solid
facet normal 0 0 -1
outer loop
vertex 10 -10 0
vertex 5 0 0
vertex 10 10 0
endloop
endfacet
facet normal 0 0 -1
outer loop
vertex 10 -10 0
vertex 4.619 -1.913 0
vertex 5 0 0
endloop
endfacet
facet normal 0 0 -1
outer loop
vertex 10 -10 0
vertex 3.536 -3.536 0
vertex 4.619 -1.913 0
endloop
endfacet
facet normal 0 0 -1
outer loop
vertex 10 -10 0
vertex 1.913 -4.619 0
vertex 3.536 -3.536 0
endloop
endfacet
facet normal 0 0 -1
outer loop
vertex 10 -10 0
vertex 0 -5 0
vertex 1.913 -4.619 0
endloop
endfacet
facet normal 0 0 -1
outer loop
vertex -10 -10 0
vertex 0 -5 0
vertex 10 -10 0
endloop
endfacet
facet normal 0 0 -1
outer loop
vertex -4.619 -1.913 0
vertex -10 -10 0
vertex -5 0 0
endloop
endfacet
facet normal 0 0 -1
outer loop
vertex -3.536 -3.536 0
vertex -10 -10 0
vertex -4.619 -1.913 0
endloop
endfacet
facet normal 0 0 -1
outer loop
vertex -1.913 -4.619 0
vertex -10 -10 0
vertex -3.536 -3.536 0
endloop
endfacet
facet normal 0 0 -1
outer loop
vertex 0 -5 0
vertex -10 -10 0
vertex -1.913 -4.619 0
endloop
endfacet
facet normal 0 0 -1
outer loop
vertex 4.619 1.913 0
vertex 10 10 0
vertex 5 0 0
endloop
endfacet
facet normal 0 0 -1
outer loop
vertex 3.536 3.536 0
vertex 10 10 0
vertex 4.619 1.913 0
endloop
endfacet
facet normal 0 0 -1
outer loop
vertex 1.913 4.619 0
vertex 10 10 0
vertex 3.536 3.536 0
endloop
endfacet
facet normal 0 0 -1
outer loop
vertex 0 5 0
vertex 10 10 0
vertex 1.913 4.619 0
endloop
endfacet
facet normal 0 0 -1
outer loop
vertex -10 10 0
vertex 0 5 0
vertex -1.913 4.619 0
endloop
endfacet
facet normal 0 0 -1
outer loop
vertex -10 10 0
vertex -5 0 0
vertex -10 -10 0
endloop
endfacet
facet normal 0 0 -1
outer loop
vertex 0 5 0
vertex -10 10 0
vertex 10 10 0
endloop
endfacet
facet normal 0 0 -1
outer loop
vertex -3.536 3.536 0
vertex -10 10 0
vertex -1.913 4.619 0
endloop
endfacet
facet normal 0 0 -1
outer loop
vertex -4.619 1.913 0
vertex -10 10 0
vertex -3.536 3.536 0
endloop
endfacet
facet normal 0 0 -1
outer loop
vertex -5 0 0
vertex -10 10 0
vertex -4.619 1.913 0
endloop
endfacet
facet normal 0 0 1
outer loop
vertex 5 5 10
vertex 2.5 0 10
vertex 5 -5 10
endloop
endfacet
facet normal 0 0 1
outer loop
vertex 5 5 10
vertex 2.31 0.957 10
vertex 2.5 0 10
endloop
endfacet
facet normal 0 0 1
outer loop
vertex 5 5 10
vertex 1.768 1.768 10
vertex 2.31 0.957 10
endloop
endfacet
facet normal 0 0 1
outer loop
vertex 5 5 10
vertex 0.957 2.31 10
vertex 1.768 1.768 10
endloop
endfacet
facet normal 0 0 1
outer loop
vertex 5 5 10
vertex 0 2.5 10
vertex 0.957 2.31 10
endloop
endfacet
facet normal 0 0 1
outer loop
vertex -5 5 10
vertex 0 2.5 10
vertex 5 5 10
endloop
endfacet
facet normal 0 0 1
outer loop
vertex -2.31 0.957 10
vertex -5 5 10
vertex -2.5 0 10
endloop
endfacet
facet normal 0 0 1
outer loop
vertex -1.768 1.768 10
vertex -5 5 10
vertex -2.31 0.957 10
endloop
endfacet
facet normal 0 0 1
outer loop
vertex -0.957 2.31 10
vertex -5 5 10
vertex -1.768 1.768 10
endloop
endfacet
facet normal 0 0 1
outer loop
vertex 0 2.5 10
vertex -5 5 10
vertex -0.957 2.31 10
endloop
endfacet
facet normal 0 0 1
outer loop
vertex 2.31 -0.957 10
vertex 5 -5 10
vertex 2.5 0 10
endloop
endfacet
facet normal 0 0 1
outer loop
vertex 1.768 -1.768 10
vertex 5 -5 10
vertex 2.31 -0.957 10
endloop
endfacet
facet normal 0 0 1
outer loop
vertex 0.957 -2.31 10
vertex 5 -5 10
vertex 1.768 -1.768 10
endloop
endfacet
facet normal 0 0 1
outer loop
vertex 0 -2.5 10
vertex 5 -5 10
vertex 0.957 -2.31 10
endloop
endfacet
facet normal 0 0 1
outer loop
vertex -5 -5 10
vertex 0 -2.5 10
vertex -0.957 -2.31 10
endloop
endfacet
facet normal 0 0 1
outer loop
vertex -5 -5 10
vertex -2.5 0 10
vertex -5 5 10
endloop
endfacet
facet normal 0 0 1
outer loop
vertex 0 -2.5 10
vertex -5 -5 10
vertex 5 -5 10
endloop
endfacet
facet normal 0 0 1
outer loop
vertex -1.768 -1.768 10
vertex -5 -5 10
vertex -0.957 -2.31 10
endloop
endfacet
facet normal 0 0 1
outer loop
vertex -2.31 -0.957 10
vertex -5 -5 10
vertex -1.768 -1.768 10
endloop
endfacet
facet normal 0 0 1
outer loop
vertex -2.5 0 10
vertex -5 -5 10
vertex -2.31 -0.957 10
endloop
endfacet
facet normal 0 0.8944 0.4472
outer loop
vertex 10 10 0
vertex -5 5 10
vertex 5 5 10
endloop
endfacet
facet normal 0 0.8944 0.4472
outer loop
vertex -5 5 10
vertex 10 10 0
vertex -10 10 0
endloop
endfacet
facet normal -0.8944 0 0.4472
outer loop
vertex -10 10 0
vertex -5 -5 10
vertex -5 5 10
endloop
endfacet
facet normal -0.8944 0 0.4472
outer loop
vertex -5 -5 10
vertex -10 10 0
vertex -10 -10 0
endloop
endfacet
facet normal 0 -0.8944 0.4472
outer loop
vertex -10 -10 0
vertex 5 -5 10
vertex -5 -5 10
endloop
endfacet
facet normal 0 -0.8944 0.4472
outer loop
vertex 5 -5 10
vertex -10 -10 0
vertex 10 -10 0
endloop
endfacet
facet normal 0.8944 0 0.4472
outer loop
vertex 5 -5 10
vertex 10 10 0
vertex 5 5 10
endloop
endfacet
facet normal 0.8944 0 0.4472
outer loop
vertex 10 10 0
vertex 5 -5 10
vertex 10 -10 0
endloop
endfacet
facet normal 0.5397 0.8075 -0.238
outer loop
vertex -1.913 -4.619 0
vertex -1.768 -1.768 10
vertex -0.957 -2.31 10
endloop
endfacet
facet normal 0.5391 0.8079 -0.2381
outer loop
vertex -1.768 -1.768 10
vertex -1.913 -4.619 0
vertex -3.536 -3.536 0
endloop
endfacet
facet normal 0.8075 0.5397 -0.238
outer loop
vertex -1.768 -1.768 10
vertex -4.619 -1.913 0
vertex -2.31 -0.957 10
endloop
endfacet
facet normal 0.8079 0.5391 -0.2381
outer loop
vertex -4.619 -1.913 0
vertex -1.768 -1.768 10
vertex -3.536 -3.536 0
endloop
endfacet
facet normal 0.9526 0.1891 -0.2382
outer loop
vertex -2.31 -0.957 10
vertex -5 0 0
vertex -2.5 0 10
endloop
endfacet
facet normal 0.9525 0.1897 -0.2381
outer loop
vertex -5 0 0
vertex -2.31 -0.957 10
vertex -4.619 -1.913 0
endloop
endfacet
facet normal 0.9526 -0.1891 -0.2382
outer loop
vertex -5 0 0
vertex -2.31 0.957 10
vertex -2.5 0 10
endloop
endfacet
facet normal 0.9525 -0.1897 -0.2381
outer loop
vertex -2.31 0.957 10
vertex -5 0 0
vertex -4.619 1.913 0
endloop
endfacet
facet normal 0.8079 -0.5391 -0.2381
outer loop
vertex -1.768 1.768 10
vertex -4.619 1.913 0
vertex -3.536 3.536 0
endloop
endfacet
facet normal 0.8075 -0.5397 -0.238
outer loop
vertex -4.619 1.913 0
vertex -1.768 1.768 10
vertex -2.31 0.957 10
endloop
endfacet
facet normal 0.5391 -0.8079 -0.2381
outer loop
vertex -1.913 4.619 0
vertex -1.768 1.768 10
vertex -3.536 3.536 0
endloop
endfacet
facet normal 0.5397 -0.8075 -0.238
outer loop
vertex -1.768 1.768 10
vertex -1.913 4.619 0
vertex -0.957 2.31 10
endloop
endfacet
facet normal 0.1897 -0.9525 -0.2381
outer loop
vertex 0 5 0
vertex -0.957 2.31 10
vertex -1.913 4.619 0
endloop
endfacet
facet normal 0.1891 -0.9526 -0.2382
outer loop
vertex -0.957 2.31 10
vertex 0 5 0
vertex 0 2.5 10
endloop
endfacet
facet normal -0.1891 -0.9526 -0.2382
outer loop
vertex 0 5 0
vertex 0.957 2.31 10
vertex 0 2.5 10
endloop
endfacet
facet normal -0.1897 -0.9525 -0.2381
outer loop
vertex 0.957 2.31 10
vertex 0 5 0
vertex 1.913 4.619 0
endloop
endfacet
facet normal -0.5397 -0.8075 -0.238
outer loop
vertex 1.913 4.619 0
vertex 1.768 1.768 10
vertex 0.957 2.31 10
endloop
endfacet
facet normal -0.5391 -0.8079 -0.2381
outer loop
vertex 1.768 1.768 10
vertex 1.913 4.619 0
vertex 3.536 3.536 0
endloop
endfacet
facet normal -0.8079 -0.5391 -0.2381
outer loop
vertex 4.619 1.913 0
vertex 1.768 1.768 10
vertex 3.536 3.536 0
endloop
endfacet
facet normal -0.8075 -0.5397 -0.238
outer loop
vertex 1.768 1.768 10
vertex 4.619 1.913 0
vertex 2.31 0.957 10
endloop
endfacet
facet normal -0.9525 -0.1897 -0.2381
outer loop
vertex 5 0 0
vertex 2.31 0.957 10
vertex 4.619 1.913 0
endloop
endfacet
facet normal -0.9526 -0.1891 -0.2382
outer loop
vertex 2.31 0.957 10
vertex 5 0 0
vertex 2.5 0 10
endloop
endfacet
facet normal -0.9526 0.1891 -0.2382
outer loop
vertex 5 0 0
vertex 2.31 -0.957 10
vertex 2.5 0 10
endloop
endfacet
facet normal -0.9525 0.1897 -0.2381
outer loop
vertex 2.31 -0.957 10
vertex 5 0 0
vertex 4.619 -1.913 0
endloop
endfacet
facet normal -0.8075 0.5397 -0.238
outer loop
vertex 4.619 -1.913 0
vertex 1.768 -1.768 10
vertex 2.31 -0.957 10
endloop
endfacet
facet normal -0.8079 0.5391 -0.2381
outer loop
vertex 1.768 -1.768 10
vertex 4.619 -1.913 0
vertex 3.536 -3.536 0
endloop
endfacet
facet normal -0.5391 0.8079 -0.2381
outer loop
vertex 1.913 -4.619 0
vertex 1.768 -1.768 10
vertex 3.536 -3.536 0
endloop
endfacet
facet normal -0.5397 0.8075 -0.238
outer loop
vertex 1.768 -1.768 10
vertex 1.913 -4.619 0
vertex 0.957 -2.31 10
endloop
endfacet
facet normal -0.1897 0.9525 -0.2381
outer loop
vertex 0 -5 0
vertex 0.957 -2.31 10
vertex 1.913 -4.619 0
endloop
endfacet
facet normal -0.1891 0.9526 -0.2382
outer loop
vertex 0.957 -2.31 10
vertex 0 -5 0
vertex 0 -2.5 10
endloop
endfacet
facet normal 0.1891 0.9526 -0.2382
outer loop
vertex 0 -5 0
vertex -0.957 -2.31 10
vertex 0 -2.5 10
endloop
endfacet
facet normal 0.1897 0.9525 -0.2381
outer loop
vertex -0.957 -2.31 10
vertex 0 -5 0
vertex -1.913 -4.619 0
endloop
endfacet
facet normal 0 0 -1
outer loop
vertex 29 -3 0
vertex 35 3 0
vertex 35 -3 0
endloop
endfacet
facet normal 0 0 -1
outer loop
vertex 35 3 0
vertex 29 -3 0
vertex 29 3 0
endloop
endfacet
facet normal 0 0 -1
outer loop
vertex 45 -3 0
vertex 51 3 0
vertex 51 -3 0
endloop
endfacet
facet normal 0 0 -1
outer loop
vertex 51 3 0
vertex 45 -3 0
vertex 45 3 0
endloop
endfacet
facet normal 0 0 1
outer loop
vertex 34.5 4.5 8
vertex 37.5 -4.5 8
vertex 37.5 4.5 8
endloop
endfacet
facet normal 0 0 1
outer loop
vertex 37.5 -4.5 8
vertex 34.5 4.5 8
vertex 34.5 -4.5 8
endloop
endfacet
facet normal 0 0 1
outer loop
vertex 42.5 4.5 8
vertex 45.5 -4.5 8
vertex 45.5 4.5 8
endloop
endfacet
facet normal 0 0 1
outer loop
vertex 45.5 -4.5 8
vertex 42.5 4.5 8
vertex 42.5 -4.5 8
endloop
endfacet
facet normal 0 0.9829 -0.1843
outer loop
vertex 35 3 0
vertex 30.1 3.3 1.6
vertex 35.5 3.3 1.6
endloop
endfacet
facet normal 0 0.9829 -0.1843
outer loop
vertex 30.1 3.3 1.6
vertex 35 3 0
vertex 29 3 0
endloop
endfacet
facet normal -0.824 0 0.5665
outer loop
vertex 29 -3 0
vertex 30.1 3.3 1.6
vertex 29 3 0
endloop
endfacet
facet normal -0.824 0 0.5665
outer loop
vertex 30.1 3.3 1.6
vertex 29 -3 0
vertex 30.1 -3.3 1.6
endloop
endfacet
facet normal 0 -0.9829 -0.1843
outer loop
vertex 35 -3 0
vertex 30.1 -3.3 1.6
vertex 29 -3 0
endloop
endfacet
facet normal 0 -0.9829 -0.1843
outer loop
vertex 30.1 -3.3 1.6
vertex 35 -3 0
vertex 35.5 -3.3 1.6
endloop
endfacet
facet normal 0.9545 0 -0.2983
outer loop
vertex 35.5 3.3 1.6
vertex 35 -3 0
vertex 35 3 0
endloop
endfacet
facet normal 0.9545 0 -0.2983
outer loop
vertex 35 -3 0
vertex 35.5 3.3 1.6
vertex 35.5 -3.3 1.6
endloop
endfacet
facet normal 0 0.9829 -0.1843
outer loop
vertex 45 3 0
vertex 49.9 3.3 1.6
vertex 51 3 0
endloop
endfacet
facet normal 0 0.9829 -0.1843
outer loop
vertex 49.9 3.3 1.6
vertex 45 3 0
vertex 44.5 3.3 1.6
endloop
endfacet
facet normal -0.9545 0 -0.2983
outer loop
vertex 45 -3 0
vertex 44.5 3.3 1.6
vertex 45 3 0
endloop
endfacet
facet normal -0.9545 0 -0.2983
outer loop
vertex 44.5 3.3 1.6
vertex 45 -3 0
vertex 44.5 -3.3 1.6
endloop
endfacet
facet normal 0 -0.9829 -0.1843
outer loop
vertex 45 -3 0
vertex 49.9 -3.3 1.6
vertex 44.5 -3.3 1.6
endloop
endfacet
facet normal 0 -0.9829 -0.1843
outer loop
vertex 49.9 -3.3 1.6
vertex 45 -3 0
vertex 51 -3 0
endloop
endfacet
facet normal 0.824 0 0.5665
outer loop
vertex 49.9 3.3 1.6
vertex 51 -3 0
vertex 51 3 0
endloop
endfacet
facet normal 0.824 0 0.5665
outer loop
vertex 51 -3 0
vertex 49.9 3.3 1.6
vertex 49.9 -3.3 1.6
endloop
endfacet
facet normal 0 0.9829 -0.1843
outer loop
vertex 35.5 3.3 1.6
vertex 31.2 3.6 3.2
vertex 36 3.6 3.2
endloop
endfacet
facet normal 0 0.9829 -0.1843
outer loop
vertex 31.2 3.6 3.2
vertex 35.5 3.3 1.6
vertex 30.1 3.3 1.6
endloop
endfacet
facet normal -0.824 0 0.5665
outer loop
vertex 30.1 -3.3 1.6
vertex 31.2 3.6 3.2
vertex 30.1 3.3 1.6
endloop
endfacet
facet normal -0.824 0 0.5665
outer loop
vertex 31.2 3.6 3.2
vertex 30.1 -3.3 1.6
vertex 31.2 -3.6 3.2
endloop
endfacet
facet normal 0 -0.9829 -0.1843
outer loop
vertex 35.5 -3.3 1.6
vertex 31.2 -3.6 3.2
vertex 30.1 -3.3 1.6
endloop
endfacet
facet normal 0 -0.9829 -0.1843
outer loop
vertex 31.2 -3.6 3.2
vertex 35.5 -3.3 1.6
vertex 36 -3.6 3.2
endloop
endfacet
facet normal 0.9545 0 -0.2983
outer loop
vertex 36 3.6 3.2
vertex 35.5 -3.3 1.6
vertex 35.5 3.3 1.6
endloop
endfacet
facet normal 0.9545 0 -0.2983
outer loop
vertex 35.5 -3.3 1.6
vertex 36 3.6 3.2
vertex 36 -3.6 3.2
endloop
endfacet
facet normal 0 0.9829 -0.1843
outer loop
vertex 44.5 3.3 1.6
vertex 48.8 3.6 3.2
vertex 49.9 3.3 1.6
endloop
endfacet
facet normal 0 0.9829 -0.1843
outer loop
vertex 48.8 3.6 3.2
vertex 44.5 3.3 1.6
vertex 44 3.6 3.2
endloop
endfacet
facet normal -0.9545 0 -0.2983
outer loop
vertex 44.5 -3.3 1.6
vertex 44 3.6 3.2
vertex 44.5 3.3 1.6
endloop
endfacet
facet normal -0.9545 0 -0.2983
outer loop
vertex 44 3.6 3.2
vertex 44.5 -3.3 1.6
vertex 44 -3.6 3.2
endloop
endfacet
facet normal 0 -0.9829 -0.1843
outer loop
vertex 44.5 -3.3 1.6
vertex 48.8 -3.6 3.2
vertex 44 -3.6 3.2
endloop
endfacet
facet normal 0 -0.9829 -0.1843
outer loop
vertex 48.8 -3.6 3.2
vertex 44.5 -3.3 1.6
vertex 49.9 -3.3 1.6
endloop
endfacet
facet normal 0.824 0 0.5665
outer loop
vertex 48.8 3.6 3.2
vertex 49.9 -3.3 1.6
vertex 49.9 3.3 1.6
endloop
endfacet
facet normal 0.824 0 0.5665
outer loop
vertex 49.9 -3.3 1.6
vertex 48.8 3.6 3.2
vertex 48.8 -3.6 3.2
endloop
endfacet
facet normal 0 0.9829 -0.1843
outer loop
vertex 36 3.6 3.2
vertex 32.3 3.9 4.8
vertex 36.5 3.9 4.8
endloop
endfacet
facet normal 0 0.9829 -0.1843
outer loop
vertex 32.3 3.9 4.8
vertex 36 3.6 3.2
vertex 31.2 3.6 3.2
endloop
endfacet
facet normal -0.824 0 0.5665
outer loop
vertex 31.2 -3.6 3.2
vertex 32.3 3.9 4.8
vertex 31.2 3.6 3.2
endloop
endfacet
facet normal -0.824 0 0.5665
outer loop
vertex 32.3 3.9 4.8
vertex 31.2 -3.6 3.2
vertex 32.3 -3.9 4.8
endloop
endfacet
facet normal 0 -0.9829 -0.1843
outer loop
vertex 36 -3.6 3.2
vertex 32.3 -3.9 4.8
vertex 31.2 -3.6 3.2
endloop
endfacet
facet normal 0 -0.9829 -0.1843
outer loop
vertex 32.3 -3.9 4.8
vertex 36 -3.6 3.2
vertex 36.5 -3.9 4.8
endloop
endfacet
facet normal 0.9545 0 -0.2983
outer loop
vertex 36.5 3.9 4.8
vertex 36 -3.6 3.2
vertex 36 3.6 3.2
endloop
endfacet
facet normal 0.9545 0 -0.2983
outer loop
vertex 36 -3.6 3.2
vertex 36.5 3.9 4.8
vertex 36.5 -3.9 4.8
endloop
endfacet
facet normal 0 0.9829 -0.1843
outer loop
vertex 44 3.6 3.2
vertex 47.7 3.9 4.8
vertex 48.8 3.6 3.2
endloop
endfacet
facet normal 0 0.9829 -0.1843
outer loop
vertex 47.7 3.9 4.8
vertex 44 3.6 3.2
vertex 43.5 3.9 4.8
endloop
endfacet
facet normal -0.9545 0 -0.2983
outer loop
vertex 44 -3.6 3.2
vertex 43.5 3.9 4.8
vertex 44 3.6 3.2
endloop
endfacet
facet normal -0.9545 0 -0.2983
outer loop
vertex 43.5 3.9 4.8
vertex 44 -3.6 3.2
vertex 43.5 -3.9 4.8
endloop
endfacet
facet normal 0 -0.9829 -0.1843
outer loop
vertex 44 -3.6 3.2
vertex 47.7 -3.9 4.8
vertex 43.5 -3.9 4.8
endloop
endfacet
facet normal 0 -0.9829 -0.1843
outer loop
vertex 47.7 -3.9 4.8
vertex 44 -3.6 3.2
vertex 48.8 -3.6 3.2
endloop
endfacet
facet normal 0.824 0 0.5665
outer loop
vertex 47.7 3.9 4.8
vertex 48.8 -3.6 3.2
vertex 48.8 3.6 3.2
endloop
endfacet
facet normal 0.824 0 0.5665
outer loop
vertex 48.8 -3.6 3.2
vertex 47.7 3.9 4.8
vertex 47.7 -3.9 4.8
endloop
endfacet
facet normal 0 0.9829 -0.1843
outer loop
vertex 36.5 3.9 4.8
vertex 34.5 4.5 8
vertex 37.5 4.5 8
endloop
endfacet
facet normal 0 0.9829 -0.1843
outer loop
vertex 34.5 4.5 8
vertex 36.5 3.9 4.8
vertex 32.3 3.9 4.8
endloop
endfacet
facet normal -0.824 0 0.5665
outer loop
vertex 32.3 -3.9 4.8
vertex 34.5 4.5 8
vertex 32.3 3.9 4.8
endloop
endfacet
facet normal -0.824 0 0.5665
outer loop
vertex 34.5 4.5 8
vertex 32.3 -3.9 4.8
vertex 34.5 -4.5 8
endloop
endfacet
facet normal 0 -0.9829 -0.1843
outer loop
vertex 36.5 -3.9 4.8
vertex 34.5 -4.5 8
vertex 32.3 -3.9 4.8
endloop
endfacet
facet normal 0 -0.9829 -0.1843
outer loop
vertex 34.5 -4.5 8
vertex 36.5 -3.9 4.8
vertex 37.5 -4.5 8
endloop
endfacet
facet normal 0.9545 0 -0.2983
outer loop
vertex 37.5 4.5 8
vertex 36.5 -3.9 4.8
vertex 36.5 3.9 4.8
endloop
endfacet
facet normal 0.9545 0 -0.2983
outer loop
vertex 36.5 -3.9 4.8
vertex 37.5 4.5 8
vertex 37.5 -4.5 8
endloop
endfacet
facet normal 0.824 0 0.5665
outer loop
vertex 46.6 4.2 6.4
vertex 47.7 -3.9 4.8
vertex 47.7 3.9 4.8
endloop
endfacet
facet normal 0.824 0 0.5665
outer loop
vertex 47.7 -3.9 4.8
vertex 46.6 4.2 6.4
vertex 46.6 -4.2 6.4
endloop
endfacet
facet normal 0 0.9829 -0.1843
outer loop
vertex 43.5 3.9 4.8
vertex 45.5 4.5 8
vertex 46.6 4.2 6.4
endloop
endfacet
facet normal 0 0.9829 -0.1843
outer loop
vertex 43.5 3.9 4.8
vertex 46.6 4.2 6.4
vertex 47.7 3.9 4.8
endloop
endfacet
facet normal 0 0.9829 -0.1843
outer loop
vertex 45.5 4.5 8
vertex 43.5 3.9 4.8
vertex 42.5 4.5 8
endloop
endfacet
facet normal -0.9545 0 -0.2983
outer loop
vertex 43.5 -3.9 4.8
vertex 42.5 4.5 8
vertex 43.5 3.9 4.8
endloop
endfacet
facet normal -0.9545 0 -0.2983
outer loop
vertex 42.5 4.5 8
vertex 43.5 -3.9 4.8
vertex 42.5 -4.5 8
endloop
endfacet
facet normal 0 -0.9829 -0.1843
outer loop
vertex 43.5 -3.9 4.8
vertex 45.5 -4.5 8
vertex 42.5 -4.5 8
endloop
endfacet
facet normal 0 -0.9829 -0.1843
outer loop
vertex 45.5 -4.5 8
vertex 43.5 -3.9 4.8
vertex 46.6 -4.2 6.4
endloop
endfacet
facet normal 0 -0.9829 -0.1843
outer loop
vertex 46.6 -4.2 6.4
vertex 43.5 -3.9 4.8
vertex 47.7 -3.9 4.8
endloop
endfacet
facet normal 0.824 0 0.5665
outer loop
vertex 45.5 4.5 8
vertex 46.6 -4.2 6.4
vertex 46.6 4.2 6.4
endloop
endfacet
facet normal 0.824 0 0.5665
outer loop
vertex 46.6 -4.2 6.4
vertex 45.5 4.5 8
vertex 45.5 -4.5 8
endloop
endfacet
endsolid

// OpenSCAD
// linear_extrude(scale=) of a profile with a hole, and of two islands: every loop is lofted on its own
// (a loft takes a section's outer wire only; the washer used to come out as a solid frustum, 24% over)
linear_extrude(height = 10, scale = 0.5) difference() { square(20, center = true); circle(5); }
translate([40, 0, 0]) linear_extrude(height = 8, scale = [0.5, 1.5]) { translate([-8, 0]) square(6, center = true); translate([8, 0]) square(6, center = true); }
